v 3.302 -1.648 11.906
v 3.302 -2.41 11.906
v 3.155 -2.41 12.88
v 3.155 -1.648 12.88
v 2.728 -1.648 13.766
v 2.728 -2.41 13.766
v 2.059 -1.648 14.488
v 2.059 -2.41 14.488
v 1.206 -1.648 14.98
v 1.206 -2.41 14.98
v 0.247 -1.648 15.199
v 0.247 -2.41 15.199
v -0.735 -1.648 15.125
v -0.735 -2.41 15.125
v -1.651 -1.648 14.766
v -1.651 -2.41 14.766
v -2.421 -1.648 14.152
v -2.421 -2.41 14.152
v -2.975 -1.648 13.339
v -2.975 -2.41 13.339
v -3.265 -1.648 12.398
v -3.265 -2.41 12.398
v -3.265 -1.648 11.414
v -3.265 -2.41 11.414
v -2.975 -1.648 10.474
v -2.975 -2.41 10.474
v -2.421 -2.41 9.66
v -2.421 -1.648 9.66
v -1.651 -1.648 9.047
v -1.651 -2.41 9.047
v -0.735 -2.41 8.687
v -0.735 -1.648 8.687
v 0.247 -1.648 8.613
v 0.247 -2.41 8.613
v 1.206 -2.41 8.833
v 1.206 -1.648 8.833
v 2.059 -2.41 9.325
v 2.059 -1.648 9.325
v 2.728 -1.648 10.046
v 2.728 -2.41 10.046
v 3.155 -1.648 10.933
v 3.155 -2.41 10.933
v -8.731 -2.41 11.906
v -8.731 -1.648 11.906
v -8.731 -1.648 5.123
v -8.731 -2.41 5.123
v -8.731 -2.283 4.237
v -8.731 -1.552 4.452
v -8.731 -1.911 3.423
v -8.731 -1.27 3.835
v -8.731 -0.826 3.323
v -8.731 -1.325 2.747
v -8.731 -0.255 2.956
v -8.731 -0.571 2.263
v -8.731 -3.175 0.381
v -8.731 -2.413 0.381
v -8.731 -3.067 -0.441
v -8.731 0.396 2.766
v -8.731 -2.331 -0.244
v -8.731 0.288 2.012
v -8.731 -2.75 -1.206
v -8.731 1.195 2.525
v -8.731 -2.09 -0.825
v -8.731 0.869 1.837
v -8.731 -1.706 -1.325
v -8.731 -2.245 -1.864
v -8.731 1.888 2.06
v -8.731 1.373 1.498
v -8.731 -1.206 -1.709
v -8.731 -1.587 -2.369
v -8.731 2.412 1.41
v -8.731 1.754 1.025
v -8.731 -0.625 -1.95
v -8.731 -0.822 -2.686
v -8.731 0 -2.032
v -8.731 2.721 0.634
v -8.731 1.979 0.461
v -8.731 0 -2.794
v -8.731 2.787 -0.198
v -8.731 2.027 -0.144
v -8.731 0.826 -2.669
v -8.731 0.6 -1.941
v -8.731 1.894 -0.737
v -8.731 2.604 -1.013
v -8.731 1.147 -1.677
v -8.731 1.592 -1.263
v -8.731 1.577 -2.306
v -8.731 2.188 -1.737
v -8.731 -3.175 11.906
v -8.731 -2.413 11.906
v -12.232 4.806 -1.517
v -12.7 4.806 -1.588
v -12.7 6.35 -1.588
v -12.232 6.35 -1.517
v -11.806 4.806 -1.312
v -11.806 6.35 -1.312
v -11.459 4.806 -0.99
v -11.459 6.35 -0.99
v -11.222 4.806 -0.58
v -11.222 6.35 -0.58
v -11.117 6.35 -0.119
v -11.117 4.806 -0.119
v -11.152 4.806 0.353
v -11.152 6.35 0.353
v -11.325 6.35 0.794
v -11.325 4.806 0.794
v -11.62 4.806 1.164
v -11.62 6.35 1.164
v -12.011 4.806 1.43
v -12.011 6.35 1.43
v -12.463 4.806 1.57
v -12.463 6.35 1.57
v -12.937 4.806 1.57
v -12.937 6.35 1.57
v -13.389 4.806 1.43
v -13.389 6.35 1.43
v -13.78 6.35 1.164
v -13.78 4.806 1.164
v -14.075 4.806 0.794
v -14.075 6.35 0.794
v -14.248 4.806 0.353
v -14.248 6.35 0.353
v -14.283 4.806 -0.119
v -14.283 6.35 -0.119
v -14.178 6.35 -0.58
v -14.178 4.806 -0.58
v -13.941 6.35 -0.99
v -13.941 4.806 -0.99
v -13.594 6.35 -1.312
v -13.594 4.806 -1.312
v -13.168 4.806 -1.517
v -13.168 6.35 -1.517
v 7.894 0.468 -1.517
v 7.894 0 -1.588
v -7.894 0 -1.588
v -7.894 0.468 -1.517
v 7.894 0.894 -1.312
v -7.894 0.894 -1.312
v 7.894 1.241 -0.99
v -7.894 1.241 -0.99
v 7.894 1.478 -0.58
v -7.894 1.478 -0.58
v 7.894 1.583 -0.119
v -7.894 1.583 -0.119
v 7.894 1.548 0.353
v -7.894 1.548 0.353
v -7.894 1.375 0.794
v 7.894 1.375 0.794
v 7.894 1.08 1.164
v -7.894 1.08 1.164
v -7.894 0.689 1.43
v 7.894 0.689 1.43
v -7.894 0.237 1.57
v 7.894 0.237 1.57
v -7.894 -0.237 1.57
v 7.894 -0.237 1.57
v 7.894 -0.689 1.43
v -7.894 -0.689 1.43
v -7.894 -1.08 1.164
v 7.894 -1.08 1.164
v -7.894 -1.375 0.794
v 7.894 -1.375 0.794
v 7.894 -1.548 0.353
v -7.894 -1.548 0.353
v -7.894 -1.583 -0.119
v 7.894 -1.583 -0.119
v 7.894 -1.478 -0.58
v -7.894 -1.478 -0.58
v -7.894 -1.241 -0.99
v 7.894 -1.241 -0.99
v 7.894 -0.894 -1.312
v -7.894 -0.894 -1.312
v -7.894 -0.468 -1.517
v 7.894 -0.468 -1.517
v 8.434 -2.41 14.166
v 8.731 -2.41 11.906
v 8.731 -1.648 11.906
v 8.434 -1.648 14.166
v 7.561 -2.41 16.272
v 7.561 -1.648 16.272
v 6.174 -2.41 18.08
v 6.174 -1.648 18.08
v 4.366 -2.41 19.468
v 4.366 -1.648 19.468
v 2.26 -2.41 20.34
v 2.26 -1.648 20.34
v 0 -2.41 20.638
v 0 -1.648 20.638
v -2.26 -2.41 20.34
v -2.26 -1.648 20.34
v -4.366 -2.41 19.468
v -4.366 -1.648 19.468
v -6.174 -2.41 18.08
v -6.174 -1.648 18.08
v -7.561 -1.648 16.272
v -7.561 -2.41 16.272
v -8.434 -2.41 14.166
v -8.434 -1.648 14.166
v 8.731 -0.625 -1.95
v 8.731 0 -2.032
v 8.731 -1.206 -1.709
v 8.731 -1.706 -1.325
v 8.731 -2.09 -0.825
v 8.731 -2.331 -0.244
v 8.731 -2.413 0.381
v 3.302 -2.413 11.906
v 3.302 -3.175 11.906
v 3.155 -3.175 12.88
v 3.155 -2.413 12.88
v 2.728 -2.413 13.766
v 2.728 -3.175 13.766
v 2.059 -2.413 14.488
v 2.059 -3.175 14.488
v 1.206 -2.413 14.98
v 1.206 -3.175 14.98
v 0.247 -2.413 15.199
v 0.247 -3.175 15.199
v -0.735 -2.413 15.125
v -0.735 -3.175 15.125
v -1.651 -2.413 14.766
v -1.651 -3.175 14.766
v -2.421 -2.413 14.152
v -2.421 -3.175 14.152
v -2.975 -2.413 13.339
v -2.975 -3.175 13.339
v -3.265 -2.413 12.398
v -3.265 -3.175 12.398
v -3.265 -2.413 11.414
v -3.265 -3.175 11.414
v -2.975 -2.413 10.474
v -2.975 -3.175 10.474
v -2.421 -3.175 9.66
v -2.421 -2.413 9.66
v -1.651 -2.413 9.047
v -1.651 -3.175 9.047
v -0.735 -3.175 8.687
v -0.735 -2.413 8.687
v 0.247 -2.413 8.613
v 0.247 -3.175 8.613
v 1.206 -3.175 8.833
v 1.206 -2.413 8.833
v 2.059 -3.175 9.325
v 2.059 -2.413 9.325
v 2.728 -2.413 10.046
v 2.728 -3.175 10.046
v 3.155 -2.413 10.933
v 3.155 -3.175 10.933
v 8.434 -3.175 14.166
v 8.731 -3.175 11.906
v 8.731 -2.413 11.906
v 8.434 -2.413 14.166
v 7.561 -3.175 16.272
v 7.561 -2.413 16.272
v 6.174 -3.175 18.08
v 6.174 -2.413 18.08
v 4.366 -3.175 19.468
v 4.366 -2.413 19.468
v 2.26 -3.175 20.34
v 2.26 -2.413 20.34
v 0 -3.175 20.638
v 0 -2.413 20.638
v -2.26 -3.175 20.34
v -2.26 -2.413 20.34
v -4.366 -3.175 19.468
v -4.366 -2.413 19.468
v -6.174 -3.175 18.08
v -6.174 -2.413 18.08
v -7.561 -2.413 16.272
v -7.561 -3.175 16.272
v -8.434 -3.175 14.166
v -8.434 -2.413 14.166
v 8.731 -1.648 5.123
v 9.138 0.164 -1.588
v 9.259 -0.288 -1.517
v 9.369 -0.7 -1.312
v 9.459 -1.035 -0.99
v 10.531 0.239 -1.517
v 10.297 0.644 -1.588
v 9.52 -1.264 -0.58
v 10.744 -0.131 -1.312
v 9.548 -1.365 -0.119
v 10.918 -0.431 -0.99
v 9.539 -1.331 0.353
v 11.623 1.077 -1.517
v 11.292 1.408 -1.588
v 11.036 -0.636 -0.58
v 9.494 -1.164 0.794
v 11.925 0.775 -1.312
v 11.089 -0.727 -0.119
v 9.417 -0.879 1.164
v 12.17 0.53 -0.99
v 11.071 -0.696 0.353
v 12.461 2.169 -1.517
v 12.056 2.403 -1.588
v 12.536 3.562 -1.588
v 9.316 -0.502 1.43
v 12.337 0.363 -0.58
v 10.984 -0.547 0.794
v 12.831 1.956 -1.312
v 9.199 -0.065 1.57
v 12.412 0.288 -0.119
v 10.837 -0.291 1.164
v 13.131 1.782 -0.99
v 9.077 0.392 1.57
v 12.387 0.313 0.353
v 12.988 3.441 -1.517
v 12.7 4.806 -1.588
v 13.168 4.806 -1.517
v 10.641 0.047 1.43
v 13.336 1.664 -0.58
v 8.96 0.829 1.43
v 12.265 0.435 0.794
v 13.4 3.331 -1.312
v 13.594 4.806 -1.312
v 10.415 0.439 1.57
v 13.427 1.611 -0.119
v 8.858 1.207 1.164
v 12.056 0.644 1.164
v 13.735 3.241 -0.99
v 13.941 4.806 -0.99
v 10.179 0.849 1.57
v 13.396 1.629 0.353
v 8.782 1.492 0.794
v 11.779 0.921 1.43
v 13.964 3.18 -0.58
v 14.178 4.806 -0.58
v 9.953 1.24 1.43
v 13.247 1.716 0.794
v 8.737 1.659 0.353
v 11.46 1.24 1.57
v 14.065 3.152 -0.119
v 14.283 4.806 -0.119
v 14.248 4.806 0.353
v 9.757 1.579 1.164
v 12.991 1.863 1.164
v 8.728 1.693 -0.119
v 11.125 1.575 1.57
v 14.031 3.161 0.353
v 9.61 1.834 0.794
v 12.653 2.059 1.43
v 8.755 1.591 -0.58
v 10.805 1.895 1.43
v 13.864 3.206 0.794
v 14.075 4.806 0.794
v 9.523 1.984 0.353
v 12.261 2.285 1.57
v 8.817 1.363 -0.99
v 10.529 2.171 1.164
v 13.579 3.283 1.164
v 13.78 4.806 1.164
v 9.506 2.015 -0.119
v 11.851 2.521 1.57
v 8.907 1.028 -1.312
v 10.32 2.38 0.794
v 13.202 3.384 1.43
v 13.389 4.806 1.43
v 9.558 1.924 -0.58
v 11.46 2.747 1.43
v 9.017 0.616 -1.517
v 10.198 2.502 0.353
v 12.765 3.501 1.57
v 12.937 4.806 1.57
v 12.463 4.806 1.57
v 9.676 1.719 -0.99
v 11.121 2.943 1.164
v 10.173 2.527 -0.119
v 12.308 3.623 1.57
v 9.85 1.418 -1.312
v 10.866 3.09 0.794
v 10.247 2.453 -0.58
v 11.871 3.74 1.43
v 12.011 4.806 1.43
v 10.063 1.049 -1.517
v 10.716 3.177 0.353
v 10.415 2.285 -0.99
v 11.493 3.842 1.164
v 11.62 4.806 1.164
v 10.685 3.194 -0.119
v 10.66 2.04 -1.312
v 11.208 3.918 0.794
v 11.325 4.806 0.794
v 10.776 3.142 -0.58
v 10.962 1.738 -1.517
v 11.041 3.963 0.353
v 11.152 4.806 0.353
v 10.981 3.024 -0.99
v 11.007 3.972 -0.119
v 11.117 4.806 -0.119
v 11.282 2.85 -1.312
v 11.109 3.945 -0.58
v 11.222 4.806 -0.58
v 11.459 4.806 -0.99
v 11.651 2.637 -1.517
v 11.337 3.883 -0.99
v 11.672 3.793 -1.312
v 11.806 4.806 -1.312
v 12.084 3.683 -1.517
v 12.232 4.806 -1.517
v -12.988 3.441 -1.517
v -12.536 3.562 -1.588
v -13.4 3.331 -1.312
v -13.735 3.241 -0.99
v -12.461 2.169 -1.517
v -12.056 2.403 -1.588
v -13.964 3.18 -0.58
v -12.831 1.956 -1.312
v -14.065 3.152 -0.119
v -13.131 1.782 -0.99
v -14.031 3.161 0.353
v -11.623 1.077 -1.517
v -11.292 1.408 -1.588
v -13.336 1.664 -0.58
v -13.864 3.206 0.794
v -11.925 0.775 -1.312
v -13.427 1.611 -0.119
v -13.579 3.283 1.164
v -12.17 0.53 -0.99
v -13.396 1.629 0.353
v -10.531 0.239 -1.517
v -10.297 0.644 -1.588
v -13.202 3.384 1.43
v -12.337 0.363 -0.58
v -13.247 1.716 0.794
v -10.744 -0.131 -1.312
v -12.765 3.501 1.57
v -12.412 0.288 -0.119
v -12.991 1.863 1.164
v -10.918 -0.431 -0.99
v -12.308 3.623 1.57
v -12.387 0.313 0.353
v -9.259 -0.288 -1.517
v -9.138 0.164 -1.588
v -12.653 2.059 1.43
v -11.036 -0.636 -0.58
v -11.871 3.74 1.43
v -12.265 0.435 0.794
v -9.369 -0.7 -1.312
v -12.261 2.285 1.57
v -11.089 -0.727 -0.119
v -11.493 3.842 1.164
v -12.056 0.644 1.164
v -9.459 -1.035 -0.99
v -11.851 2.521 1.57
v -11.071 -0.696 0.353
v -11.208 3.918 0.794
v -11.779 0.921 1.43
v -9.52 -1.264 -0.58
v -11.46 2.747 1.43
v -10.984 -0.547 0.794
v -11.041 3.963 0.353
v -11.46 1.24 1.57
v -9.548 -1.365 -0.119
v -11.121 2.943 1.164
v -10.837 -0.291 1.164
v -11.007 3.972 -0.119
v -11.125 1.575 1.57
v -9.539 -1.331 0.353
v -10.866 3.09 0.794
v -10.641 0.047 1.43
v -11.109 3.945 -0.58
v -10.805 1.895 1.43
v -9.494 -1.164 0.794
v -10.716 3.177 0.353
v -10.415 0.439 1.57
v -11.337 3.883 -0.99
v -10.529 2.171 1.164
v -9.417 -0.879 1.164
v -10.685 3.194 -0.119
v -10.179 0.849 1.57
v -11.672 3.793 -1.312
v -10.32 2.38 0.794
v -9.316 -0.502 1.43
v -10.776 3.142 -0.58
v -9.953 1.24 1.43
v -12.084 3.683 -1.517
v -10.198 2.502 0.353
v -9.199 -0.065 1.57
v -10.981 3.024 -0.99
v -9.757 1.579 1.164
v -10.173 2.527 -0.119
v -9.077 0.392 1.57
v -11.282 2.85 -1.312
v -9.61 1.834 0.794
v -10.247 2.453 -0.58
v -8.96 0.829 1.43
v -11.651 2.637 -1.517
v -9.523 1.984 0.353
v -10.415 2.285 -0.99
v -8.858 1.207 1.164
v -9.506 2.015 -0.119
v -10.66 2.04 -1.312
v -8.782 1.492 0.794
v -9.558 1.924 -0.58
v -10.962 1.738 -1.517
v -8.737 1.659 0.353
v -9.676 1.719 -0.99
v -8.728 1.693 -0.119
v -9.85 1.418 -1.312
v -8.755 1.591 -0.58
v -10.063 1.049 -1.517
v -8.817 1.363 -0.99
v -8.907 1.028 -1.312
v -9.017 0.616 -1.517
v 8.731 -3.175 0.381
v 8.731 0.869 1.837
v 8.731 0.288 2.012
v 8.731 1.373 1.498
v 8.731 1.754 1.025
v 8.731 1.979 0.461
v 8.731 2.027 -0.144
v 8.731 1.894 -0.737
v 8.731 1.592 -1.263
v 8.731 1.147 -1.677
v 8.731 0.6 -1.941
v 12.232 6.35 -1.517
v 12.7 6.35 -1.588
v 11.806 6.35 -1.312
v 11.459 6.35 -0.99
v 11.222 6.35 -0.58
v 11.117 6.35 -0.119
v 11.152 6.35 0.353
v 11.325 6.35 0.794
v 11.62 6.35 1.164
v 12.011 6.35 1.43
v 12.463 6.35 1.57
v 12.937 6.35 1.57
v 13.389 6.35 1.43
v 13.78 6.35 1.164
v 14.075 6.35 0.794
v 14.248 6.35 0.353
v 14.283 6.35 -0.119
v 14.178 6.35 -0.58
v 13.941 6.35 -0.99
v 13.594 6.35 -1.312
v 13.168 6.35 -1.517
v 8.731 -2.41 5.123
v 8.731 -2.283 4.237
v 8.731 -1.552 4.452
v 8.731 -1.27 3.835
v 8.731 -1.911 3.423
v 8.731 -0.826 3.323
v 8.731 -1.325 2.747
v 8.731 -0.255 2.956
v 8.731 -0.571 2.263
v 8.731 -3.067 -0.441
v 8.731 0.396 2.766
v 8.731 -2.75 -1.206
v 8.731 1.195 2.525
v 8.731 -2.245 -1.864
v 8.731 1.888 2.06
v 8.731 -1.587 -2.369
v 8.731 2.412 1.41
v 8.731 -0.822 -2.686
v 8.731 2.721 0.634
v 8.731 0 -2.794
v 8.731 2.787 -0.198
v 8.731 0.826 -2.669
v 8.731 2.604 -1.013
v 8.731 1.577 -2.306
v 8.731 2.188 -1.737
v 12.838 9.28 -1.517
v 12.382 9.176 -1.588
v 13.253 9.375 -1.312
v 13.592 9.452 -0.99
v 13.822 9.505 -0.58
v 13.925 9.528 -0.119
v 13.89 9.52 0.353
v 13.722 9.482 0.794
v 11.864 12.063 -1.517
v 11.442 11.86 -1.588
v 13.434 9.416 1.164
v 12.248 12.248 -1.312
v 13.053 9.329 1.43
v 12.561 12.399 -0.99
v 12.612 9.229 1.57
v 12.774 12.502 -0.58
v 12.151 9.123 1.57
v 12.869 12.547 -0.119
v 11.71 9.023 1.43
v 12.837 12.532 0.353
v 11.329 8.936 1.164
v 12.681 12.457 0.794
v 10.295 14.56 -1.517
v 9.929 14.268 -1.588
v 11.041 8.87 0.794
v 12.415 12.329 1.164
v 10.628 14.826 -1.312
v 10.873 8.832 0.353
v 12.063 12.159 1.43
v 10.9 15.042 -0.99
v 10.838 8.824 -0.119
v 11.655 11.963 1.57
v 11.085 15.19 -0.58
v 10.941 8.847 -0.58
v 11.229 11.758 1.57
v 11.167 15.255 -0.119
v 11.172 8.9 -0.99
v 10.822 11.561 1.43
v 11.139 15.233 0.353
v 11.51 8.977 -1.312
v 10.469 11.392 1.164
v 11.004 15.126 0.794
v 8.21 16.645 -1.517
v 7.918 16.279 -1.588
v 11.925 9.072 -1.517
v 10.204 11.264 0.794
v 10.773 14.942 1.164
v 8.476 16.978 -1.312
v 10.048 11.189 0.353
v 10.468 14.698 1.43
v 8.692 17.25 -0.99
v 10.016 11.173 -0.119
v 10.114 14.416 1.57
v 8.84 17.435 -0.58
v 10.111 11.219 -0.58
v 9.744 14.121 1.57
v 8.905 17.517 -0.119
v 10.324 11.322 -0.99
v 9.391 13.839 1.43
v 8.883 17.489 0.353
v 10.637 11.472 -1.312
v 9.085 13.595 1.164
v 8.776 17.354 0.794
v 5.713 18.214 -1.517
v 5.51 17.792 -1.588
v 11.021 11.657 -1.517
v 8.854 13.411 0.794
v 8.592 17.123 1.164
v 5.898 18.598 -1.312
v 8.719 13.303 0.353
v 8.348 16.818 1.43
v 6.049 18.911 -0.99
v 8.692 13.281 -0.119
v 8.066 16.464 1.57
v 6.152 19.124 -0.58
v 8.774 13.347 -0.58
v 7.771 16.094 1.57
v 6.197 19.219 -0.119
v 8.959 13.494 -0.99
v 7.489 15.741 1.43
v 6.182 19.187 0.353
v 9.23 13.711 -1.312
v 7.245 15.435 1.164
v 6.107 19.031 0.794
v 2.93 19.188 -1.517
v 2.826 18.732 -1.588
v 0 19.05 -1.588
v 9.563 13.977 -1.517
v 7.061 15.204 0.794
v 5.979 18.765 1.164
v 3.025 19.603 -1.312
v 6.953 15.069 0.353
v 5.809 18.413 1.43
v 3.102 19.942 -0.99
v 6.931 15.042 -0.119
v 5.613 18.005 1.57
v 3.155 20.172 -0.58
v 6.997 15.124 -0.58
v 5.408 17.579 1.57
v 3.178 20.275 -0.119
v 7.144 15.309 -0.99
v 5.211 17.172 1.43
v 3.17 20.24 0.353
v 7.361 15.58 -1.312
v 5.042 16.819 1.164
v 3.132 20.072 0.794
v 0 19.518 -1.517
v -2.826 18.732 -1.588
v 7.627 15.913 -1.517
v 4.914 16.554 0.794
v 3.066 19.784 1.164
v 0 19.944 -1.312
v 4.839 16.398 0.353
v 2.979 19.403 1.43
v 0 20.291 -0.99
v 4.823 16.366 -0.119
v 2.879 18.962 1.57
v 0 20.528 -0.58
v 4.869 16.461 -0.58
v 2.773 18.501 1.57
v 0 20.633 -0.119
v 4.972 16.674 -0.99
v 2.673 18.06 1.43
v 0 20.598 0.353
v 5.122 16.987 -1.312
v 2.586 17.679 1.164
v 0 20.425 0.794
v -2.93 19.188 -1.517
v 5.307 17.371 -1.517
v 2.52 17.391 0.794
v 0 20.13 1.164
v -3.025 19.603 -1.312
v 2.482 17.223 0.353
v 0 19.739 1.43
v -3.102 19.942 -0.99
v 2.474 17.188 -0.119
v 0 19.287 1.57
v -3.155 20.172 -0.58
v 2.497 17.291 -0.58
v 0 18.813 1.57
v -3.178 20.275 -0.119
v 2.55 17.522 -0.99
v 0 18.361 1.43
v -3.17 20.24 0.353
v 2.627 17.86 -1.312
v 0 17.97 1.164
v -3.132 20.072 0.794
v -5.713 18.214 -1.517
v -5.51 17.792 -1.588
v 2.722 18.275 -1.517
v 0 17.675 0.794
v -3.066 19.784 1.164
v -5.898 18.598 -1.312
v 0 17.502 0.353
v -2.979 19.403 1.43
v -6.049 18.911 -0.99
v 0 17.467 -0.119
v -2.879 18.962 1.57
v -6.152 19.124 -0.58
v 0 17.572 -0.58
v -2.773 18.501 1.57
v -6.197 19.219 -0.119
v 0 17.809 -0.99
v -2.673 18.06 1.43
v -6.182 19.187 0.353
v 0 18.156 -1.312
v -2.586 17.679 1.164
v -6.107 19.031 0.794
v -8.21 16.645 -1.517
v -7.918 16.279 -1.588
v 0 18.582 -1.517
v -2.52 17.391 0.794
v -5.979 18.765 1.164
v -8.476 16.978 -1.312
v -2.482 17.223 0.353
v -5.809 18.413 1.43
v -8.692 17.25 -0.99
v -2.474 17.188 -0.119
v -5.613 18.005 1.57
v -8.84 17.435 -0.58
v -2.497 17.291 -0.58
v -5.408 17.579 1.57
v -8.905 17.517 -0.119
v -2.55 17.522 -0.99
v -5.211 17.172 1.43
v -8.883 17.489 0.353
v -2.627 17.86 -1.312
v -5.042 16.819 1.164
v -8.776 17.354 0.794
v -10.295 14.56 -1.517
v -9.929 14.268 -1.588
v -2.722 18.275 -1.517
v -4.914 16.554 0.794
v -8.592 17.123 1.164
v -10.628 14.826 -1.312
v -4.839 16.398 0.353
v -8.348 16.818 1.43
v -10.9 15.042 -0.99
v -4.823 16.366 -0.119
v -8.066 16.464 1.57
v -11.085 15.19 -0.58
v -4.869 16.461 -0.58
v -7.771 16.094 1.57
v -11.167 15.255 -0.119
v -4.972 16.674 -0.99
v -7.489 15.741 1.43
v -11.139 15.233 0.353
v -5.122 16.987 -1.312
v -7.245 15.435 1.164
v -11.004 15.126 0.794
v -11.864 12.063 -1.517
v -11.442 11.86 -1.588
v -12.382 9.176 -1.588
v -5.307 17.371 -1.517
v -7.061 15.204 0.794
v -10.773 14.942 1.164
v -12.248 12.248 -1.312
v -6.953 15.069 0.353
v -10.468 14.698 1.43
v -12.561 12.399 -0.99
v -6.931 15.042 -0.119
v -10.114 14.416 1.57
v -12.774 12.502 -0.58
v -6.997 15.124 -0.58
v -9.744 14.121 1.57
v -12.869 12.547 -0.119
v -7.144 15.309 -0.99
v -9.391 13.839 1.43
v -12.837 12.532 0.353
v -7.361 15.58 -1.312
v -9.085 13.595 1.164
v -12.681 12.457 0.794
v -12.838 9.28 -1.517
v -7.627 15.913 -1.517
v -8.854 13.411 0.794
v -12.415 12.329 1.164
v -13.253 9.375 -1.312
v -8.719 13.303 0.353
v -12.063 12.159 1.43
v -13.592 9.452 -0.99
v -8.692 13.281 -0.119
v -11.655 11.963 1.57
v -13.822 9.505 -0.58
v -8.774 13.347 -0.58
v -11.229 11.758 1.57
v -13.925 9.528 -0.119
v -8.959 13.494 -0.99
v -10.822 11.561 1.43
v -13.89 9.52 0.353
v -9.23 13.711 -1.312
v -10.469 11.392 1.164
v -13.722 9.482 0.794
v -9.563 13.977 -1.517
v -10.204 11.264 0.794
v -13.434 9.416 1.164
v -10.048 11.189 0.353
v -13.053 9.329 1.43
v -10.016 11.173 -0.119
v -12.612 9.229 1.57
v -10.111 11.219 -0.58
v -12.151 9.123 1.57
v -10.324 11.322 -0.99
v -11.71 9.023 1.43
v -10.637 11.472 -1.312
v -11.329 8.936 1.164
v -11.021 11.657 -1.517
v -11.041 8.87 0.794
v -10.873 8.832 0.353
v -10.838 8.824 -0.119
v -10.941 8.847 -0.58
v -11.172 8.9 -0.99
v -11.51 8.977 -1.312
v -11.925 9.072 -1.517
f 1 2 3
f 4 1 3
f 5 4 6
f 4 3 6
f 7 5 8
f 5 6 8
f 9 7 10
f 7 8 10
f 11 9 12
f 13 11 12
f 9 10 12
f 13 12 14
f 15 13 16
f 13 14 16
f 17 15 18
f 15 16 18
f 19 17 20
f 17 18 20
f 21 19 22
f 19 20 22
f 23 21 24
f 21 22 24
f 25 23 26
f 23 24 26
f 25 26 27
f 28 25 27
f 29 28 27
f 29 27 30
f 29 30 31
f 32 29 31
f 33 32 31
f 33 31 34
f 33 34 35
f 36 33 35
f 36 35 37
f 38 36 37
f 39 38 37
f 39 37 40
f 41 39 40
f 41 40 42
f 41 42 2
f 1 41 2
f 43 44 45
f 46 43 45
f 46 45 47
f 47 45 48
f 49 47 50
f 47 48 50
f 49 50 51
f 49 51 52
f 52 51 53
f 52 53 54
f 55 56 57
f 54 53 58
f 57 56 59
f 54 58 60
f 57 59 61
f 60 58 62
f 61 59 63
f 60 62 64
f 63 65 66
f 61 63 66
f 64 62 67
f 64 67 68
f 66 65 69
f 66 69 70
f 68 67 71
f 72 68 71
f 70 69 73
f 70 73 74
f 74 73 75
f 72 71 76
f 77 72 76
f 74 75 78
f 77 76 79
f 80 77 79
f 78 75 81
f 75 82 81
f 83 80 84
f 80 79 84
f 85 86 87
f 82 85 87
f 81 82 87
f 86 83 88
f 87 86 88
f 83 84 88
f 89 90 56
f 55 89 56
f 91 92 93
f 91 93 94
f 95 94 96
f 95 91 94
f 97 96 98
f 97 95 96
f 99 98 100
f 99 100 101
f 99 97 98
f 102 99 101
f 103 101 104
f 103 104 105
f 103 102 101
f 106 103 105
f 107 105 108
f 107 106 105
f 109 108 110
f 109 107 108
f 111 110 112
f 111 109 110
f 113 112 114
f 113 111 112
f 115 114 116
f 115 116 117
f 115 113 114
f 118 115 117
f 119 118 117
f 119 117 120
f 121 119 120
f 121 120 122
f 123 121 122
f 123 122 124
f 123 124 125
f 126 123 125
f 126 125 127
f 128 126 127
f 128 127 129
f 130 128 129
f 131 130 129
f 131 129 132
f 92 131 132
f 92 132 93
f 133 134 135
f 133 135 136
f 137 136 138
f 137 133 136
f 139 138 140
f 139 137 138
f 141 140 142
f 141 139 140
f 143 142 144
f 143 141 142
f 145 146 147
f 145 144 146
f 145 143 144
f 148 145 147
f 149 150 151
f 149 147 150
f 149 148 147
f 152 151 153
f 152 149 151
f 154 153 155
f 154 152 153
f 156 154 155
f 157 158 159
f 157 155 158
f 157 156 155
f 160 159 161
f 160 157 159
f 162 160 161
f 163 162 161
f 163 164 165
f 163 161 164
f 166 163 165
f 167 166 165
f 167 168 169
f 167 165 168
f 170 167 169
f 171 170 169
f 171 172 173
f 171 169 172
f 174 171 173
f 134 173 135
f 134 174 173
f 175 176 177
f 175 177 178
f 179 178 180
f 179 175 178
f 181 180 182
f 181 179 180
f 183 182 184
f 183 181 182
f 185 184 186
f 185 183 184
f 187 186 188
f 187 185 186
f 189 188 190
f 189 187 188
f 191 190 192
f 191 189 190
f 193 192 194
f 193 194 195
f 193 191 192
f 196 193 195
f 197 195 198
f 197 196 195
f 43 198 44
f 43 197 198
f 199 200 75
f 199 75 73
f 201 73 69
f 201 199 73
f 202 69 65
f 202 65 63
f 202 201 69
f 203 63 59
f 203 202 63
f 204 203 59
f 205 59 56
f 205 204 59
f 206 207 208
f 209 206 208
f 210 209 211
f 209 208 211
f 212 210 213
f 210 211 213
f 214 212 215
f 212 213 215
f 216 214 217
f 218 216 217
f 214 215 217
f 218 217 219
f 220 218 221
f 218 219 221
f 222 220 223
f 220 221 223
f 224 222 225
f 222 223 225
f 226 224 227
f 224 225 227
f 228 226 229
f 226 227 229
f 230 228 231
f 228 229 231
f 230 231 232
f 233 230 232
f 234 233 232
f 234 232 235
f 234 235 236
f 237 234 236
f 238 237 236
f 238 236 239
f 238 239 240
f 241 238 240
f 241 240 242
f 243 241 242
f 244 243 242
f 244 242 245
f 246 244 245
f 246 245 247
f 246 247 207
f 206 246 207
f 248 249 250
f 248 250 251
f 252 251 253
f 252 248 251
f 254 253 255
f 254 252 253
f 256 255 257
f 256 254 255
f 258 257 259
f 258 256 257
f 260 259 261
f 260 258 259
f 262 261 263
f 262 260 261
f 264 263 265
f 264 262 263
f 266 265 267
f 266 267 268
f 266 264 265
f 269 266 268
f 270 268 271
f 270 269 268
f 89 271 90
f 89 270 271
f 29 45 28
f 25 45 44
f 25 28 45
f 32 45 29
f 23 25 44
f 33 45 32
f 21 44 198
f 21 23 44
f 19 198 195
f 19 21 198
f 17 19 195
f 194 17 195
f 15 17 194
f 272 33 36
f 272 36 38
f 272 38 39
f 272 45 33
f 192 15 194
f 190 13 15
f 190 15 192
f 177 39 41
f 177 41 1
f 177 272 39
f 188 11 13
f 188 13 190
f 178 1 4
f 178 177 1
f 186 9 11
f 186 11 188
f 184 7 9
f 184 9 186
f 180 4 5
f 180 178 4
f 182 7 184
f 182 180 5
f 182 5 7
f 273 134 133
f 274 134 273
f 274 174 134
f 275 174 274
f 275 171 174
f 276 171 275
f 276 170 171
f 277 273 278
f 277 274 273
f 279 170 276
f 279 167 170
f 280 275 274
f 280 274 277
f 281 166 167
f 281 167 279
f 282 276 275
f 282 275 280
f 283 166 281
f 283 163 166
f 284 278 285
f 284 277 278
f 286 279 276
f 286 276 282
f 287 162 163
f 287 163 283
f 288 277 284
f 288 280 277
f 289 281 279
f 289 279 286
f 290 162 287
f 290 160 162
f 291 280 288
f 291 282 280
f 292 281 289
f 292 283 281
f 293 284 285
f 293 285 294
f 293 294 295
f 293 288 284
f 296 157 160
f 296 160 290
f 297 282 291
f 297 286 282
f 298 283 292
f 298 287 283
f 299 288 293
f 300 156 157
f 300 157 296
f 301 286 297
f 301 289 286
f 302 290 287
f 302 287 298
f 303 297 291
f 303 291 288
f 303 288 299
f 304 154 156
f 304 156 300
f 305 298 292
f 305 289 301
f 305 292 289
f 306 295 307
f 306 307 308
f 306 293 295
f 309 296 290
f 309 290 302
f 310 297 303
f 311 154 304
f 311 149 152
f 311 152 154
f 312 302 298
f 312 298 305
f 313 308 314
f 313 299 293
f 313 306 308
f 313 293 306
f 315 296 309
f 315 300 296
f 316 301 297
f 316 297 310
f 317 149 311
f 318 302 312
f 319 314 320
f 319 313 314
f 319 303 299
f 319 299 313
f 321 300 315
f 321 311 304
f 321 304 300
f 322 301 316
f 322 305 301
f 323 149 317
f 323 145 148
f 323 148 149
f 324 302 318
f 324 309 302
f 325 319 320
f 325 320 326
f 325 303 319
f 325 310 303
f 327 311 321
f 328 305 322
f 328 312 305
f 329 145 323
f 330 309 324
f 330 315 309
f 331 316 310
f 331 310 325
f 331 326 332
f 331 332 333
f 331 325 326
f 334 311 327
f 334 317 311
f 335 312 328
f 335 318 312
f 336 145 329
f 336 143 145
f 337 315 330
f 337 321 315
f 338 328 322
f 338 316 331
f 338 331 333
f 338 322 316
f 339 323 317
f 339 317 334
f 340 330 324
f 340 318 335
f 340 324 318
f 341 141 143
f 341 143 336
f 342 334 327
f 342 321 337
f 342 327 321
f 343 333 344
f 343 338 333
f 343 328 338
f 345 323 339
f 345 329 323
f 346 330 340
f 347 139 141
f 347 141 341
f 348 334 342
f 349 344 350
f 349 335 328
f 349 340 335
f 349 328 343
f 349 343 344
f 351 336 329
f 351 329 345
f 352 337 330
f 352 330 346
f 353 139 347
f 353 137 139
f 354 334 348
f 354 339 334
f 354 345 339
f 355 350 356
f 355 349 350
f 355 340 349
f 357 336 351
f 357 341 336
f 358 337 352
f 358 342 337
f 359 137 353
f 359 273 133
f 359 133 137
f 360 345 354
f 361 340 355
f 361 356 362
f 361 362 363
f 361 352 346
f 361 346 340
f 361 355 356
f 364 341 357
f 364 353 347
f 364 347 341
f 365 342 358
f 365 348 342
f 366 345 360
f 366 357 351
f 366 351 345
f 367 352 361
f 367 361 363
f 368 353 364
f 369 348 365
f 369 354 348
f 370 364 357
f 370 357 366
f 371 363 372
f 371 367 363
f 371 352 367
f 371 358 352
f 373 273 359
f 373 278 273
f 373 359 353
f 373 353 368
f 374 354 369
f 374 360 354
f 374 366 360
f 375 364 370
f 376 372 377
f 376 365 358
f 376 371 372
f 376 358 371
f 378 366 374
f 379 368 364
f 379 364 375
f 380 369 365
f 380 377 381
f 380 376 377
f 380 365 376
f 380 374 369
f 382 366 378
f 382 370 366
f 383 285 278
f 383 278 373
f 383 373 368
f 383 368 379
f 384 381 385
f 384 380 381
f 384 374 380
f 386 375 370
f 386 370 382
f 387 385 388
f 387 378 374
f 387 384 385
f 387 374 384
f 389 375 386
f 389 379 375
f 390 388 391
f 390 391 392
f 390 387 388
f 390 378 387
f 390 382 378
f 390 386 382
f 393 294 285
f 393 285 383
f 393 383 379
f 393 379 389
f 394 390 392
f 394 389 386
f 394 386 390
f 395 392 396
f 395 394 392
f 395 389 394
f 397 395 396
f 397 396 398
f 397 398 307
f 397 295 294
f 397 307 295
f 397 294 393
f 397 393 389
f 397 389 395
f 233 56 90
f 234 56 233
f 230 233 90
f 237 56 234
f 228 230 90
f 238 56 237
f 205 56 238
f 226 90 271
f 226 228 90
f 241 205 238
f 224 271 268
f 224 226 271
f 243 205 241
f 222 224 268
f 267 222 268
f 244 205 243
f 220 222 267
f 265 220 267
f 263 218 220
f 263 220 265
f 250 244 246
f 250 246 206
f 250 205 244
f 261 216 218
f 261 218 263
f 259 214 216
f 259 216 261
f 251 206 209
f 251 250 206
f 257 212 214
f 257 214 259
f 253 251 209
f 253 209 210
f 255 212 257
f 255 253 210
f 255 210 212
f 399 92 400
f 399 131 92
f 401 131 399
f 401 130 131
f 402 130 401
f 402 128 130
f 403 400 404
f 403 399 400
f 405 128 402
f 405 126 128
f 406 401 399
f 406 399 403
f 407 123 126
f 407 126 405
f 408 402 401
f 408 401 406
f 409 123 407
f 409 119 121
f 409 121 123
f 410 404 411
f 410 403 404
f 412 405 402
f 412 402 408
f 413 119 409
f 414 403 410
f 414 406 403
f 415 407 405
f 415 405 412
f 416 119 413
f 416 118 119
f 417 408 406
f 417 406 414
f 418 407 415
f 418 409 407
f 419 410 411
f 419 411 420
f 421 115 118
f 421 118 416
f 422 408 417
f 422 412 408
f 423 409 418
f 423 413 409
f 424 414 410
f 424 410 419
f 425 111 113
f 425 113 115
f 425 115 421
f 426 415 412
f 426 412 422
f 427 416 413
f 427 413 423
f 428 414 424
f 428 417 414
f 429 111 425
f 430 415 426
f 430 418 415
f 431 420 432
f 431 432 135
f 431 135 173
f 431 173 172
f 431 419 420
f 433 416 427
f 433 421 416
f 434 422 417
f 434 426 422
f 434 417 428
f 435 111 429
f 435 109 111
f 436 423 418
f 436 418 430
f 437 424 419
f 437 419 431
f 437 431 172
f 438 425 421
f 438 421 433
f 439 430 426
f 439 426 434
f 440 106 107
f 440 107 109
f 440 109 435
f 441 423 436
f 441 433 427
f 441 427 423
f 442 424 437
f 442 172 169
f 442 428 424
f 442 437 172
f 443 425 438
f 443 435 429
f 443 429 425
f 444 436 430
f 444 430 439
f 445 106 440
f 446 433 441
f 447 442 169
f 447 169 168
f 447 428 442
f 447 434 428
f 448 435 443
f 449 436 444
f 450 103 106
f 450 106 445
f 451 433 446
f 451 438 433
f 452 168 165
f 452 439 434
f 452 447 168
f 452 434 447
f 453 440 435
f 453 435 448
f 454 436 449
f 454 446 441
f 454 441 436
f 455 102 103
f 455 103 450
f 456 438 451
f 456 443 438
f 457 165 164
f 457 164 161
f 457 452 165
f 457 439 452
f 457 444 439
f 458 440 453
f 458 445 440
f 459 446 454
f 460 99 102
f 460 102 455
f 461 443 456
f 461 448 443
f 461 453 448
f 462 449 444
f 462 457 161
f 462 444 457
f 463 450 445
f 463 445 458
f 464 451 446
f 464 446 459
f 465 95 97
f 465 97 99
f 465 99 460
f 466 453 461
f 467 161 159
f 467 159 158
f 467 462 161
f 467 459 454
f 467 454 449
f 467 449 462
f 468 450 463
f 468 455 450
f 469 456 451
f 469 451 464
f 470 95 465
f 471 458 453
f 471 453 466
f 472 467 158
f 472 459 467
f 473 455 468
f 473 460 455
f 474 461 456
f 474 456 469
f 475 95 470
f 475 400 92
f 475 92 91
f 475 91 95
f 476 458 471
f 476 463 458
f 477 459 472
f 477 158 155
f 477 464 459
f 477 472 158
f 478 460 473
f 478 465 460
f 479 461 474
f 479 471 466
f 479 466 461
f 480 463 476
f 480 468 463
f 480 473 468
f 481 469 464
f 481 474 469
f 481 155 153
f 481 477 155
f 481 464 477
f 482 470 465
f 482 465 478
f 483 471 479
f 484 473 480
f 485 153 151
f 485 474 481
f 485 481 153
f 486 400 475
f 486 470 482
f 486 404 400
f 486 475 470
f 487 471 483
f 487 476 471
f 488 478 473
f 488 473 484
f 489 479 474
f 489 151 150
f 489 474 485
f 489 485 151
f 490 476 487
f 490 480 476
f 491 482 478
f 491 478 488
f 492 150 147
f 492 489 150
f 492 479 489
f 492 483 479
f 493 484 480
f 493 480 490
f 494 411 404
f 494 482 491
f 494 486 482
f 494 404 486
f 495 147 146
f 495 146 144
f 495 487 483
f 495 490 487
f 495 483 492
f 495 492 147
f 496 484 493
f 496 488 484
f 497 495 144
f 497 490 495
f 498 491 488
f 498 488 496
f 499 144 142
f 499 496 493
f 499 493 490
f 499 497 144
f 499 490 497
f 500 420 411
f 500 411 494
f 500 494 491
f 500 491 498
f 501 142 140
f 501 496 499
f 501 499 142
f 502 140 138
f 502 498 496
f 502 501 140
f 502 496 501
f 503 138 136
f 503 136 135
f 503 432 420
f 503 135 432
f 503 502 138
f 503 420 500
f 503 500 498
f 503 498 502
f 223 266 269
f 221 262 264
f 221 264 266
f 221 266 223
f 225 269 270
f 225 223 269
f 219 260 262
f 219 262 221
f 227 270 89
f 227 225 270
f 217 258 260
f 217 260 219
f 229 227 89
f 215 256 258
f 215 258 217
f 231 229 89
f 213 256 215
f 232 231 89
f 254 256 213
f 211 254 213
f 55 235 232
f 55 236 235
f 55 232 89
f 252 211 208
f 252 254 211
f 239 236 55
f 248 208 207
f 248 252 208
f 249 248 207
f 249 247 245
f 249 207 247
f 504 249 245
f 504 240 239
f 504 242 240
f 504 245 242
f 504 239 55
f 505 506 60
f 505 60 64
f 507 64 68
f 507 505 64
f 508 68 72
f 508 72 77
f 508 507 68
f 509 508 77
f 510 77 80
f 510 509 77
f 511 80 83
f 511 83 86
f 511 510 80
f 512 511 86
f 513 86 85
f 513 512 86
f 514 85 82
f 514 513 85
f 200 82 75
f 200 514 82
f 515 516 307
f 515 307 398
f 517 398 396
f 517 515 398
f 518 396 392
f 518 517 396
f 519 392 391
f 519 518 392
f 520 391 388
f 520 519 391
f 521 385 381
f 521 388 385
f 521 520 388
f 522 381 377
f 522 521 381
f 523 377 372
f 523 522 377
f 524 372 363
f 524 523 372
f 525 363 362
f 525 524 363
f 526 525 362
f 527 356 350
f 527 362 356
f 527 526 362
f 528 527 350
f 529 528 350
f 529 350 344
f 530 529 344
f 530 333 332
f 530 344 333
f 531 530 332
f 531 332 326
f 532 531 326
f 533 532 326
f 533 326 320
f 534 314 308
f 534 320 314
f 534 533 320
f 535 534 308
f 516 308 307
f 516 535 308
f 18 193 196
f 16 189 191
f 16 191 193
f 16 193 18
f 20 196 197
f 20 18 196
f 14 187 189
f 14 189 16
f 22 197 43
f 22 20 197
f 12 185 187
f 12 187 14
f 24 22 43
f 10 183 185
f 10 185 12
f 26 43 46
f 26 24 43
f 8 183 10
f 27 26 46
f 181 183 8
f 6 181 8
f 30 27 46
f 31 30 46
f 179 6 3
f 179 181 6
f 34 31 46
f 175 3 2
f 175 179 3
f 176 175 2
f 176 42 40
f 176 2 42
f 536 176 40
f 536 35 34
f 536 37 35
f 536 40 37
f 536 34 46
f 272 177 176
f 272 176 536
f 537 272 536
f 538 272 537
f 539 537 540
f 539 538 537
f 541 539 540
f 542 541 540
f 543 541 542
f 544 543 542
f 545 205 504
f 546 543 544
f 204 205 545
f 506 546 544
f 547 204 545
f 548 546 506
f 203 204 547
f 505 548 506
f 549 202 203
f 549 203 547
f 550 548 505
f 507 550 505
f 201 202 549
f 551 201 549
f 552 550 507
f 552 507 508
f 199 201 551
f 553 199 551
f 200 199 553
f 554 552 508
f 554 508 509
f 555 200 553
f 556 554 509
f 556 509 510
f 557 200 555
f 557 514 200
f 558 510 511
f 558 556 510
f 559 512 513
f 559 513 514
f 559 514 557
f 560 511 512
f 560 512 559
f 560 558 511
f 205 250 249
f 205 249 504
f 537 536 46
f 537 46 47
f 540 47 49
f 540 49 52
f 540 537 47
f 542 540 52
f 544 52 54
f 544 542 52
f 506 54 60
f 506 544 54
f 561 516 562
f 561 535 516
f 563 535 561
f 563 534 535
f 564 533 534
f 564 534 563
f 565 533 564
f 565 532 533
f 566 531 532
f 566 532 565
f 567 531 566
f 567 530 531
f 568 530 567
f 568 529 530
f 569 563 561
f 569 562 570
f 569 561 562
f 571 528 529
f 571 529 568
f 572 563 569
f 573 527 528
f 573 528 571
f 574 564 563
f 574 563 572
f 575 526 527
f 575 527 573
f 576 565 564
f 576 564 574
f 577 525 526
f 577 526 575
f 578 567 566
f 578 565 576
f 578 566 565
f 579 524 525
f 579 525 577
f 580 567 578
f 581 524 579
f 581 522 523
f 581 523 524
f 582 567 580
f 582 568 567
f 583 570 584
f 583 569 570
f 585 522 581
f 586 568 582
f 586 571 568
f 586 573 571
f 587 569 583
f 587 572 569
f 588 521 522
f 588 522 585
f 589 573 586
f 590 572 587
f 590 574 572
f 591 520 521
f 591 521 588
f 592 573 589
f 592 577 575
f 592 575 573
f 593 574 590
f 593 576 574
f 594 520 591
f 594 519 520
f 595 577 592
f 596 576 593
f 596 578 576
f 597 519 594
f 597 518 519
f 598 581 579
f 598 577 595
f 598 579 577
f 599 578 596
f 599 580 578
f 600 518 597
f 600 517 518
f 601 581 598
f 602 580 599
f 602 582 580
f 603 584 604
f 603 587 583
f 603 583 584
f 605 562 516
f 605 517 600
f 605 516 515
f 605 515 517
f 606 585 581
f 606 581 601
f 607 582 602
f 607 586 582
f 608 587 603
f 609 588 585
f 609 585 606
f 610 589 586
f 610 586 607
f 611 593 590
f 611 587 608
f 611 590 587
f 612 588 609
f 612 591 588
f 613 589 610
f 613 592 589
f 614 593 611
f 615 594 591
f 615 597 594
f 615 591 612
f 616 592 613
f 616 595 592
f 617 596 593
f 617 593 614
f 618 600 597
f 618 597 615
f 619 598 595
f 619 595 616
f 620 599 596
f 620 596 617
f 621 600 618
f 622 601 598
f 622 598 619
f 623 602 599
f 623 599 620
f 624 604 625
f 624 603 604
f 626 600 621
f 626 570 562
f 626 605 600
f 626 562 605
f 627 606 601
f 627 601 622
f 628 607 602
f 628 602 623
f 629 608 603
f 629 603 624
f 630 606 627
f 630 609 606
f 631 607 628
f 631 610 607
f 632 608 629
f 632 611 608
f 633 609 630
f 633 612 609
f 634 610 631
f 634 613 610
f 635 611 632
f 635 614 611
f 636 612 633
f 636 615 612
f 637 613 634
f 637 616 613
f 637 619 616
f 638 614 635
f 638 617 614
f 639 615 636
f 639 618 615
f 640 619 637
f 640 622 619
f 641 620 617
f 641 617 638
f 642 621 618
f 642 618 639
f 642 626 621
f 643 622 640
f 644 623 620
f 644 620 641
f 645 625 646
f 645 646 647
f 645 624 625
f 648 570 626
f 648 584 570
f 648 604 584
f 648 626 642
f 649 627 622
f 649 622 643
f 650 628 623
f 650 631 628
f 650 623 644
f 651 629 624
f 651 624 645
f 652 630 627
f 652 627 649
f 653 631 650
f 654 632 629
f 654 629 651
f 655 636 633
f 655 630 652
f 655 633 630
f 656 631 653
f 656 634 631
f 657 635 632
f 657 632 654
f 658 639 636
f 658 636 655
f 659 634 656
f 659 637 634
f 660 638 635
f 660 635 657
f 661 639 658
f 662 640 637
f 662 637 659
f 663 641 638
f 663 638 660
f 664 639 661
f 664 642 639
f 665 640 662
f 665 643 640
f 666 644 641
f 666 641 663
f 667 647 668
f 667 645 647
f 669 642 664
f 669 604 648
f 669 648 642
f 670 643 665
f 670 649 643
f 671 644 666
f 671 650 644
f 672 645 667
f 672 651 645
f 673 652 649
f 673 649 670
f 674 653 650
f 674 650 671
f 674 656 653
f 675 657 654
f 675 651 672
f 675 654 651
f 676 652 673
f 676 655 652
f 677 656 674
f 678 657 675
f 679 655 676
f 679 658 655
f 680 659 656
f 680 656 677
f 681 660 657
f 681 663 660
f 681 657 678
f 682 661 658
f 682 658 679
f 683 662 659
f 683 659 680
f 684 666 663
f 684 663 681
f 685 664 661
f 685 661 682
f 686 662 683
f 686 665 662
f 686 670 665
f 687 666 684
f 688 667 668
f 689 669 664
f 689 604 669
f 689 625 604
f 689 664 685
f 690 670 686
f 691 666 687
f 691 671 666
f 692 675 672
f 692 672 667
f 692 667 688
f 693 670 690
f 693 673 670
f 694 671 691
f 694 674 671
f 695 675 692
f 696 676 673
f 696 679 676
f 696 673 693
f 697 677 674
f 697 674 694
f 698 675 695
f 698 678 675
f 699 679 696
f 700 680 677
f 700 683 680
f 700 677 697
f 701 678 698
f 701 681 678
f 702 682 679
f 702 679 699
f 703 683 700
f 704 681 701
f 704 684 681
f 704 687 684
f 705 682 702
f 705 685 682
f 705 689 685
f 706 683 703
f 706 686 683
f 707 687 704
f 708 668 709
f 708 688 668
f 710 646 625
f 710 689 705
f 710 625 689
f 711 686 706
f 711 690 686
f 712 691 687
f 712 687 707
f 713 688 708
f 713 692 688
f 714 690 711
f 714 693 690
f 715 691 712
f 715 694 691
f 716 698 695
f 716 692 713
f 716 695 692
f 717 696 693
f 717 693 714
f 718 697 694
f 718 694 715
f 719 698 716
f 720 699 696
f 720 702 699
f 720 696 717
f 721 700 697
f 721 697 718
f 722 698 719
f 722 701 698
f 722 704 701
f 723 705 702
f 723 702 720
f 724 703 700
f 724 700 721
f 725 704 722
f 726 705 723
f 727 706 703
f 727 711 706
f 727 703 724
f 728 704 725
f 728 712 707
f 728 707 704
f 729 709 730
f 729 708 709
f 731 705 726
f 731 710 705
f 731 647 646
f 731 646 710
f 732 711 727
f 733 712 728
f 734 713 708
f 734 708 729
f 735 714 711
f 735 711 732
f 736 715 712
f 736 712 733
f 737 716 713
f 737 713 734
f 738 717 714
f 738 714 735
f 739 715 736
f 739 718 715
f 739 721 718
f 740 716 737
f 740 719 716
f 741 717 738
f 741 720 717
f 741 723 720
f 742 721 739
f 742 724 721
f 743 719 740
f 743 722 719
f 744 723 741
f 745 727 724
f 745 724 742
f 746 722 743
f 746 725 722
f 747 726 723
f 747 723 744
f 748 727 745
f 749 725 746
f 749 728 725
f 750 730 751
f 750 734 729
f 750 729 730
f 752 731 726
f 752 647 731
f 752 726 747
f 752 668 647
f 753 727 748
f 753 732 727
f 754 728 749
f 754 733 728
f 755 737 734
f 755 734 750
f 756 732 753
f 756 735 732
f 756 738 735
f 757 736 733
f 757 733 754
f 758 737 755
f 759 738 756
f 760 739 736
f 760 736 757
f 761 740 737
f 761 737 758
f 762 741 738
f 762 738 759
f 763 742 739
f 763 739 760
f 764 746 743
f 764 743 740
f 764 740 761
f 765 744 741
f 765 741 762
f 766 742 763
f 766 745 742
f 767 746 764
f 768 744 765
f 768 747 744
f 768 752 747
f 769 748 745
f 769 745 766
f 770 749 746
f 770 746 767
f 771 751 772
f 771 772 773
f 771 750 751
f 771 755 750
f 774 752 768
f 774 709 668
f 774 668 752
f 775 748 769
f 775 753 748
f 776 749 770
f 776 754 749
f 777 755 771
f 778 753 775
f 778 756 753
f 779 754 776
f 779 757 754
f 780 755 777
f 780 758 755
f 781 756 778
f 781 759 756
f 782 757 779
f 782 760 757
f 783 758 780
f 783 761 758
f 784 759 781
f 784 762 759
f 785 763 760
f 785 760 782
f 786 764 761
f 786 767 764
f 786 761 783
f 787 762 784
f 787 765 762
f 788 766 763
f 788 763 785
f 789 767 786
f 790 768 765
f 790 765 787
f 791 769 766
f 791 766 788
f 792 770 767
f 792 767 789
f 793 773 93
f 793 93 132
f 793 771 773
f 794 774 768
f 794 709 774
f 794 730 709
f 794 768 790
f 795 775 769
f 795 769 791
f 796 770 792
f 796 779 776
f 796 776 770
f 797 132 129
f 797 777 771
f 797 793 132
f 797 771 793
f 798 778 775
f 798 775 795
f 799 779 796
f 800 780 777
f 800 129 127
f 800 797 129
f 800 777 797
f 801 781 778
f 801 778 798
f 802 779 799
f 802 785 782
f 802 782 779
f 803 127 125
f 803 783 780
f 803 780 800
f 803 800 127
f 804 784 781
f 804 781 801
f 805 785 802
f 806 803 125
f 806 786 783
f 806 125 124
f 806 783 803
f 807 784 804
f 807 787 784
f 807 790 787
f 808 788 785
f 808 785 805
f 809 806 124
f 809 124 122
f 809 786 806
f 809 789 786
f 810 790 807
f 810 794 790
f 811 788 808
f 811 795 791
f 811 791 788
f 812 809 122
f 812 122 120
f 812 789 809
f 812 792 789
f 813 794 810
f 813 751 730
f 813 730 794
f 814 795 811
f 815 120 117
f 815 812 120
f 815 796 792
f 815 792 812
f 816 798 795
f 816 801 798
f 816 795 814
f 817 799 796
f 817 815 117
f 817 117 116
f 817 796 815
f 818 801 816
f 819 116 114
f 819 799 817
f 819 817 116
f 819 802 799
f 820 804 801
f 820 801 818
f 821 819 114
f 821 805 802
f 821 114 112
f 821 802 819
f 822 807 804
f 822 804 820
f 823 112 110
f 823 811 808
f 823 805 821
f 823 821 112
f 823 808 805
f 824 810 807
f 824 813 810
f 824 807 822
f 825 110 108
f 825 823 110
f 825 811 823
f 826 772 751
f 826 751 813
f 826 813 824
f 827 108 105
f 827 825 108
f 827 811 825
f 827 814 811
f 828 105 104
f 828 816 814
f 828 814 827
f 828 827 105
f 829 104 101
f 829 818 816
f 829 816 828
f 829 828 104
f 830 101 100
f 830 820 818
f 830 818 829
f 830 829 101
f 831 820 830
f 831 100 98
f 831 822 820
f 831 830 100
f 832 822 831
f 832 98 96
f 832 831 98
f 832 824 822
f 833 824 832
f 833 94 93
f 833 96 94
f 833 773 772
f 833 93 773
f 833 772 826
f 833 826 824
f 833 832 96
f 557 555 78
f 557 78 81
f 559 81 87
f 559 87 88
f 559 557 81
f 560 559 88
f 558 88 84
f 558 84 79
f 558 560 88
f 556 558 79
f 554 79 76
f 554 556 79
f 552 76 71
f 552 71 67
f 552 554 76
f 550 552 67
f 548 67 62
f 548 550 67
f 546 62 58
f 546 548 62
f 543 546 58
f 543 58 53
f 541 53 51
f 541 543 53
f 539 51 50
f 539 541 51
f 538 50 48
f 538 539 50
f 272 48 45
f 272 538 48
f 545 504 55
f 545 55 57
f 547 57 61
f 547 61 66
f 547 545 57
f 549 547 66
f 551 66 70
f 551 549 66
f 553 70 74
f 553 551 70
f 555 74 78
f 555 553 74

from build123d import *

# Parameters (mm, degrees)
SKETCH2_R           = 1.5875
BOSS_EXTRUDE1_DEPTH = 8.73125
SKETCH4_R           = 3.302
CUT_EXTRUDE1_DEPTH  = 24.8125001


with BuildPart() as part:
    # Sweep1: sweep along a path in Sketch1
    with BuildLine(Plane.XY) as sweep1_path:
        Line((-12.7, 6.35), (-12.7, 4.805901242))
        ThreePointArc((-12.7, 4.805901242), (-11.292384116, 1.407615884), (-7.894098758, 0))
        Line((-7.894098758, 0), (7.894098758, 0))
        ThreePointArc((7.894098758, 0), (11.292384116, 1.407615884), (12.7, 4.805901242))
        Line((12.7, 4.805901242), (12.7, 6.35))
        ThreePointArc((12.7, 6.35), (0, 19.05), (-12.7, 6.35))
    # Sketch2 → Sweep1 (sweep)
    with BuildSketch(Plane(origin=(0, 0, 0), x_dir=(0, 0, -1), z_dir=(1, 0, 0))):
        Circle(SKETCH2_R)
    sweep(path=sweep1_path.line)


with BuildPart() as body_2:
    # Sketch3 → Boss-Extrude1 (new body, symmetric)
    with BuildSketch(Plane(origin=(0, 0, 0), x_dir=(0, 0, -1), z_dir=(1, 0, 0))):
        with BuildLine():
            Line((-20.6375, -3.175), (-0.381, -3.175))
            ThreePointArc((-0.381, -3.175), (1.86406403, -2.24506403), (2.794, 0))
            ThreePointArc((2.794, 0), (0.198308481, 2.786953488), (-2.765849496, 0.395616687))
            ThreePointArc((-2.765849496, 0.395616687), (-3.563066307, -1.066271632), (-5.12310759, -1.64846))
            Line((-5.12310759, -1.64846), (-20.6375, -1.64846))
            Line((-20.6375, -1.64846), (-20.6375, -2.41046))
            Line((-20.6375, -2.41046), (-5.12310759, -2.41046))
            ThreePointArc((-5.12310759, -2.41046), (-3.063853096, -1.641971355), (-2.011526906, 0.287721227))
            ThreePointArc((-2.011526906, 0.287721227), (0.14422435, 2.026875264), (2.032, 0))
            ThreePointArc((2.032, 0), (1.325248663, -1.706248663), (-0.381, -2.413))
            Line((-0.381, -2.413), (-20.6375, -2.413))
            Line((-20.6375, -2.413), (-20.6375, -3.175))
        make_face()
    extrude(amount=BOSS_EXTRUDE1_DEPTH, both=True)

    # Sketch4 → Cut-Extrude1 (cut, through all)
    with BuildSketch(Plane.XZ.offset(3.175)):
        with Locations((0, 11.90625)):
            Circle(SKETCH4_R)
        with BuildLine():
            Line((-8.73125, 11.90625), (-8.73125, 20.6375))
            Line((-8.73125, 20.6375), (-8.73125, 21.9075))
            Line((-8.73125, 21.9075), (8.73125, 21.9075))
            Line((8.73125, 21.9075), (8.73125, 20.6375))
            Line((8.73125, 20.6375), (8.73125, 11.90625))
            ThreePointArc((8.73125, 11.90625), (0, 20.6375), (-8.73125, 11.90625))
        make_face()
    extrude(amount=-CUT_EXTRUDE1_DEPTH, mode=Mode.SUBTRACT)


solid = Compound([part.part, body_2.part])
